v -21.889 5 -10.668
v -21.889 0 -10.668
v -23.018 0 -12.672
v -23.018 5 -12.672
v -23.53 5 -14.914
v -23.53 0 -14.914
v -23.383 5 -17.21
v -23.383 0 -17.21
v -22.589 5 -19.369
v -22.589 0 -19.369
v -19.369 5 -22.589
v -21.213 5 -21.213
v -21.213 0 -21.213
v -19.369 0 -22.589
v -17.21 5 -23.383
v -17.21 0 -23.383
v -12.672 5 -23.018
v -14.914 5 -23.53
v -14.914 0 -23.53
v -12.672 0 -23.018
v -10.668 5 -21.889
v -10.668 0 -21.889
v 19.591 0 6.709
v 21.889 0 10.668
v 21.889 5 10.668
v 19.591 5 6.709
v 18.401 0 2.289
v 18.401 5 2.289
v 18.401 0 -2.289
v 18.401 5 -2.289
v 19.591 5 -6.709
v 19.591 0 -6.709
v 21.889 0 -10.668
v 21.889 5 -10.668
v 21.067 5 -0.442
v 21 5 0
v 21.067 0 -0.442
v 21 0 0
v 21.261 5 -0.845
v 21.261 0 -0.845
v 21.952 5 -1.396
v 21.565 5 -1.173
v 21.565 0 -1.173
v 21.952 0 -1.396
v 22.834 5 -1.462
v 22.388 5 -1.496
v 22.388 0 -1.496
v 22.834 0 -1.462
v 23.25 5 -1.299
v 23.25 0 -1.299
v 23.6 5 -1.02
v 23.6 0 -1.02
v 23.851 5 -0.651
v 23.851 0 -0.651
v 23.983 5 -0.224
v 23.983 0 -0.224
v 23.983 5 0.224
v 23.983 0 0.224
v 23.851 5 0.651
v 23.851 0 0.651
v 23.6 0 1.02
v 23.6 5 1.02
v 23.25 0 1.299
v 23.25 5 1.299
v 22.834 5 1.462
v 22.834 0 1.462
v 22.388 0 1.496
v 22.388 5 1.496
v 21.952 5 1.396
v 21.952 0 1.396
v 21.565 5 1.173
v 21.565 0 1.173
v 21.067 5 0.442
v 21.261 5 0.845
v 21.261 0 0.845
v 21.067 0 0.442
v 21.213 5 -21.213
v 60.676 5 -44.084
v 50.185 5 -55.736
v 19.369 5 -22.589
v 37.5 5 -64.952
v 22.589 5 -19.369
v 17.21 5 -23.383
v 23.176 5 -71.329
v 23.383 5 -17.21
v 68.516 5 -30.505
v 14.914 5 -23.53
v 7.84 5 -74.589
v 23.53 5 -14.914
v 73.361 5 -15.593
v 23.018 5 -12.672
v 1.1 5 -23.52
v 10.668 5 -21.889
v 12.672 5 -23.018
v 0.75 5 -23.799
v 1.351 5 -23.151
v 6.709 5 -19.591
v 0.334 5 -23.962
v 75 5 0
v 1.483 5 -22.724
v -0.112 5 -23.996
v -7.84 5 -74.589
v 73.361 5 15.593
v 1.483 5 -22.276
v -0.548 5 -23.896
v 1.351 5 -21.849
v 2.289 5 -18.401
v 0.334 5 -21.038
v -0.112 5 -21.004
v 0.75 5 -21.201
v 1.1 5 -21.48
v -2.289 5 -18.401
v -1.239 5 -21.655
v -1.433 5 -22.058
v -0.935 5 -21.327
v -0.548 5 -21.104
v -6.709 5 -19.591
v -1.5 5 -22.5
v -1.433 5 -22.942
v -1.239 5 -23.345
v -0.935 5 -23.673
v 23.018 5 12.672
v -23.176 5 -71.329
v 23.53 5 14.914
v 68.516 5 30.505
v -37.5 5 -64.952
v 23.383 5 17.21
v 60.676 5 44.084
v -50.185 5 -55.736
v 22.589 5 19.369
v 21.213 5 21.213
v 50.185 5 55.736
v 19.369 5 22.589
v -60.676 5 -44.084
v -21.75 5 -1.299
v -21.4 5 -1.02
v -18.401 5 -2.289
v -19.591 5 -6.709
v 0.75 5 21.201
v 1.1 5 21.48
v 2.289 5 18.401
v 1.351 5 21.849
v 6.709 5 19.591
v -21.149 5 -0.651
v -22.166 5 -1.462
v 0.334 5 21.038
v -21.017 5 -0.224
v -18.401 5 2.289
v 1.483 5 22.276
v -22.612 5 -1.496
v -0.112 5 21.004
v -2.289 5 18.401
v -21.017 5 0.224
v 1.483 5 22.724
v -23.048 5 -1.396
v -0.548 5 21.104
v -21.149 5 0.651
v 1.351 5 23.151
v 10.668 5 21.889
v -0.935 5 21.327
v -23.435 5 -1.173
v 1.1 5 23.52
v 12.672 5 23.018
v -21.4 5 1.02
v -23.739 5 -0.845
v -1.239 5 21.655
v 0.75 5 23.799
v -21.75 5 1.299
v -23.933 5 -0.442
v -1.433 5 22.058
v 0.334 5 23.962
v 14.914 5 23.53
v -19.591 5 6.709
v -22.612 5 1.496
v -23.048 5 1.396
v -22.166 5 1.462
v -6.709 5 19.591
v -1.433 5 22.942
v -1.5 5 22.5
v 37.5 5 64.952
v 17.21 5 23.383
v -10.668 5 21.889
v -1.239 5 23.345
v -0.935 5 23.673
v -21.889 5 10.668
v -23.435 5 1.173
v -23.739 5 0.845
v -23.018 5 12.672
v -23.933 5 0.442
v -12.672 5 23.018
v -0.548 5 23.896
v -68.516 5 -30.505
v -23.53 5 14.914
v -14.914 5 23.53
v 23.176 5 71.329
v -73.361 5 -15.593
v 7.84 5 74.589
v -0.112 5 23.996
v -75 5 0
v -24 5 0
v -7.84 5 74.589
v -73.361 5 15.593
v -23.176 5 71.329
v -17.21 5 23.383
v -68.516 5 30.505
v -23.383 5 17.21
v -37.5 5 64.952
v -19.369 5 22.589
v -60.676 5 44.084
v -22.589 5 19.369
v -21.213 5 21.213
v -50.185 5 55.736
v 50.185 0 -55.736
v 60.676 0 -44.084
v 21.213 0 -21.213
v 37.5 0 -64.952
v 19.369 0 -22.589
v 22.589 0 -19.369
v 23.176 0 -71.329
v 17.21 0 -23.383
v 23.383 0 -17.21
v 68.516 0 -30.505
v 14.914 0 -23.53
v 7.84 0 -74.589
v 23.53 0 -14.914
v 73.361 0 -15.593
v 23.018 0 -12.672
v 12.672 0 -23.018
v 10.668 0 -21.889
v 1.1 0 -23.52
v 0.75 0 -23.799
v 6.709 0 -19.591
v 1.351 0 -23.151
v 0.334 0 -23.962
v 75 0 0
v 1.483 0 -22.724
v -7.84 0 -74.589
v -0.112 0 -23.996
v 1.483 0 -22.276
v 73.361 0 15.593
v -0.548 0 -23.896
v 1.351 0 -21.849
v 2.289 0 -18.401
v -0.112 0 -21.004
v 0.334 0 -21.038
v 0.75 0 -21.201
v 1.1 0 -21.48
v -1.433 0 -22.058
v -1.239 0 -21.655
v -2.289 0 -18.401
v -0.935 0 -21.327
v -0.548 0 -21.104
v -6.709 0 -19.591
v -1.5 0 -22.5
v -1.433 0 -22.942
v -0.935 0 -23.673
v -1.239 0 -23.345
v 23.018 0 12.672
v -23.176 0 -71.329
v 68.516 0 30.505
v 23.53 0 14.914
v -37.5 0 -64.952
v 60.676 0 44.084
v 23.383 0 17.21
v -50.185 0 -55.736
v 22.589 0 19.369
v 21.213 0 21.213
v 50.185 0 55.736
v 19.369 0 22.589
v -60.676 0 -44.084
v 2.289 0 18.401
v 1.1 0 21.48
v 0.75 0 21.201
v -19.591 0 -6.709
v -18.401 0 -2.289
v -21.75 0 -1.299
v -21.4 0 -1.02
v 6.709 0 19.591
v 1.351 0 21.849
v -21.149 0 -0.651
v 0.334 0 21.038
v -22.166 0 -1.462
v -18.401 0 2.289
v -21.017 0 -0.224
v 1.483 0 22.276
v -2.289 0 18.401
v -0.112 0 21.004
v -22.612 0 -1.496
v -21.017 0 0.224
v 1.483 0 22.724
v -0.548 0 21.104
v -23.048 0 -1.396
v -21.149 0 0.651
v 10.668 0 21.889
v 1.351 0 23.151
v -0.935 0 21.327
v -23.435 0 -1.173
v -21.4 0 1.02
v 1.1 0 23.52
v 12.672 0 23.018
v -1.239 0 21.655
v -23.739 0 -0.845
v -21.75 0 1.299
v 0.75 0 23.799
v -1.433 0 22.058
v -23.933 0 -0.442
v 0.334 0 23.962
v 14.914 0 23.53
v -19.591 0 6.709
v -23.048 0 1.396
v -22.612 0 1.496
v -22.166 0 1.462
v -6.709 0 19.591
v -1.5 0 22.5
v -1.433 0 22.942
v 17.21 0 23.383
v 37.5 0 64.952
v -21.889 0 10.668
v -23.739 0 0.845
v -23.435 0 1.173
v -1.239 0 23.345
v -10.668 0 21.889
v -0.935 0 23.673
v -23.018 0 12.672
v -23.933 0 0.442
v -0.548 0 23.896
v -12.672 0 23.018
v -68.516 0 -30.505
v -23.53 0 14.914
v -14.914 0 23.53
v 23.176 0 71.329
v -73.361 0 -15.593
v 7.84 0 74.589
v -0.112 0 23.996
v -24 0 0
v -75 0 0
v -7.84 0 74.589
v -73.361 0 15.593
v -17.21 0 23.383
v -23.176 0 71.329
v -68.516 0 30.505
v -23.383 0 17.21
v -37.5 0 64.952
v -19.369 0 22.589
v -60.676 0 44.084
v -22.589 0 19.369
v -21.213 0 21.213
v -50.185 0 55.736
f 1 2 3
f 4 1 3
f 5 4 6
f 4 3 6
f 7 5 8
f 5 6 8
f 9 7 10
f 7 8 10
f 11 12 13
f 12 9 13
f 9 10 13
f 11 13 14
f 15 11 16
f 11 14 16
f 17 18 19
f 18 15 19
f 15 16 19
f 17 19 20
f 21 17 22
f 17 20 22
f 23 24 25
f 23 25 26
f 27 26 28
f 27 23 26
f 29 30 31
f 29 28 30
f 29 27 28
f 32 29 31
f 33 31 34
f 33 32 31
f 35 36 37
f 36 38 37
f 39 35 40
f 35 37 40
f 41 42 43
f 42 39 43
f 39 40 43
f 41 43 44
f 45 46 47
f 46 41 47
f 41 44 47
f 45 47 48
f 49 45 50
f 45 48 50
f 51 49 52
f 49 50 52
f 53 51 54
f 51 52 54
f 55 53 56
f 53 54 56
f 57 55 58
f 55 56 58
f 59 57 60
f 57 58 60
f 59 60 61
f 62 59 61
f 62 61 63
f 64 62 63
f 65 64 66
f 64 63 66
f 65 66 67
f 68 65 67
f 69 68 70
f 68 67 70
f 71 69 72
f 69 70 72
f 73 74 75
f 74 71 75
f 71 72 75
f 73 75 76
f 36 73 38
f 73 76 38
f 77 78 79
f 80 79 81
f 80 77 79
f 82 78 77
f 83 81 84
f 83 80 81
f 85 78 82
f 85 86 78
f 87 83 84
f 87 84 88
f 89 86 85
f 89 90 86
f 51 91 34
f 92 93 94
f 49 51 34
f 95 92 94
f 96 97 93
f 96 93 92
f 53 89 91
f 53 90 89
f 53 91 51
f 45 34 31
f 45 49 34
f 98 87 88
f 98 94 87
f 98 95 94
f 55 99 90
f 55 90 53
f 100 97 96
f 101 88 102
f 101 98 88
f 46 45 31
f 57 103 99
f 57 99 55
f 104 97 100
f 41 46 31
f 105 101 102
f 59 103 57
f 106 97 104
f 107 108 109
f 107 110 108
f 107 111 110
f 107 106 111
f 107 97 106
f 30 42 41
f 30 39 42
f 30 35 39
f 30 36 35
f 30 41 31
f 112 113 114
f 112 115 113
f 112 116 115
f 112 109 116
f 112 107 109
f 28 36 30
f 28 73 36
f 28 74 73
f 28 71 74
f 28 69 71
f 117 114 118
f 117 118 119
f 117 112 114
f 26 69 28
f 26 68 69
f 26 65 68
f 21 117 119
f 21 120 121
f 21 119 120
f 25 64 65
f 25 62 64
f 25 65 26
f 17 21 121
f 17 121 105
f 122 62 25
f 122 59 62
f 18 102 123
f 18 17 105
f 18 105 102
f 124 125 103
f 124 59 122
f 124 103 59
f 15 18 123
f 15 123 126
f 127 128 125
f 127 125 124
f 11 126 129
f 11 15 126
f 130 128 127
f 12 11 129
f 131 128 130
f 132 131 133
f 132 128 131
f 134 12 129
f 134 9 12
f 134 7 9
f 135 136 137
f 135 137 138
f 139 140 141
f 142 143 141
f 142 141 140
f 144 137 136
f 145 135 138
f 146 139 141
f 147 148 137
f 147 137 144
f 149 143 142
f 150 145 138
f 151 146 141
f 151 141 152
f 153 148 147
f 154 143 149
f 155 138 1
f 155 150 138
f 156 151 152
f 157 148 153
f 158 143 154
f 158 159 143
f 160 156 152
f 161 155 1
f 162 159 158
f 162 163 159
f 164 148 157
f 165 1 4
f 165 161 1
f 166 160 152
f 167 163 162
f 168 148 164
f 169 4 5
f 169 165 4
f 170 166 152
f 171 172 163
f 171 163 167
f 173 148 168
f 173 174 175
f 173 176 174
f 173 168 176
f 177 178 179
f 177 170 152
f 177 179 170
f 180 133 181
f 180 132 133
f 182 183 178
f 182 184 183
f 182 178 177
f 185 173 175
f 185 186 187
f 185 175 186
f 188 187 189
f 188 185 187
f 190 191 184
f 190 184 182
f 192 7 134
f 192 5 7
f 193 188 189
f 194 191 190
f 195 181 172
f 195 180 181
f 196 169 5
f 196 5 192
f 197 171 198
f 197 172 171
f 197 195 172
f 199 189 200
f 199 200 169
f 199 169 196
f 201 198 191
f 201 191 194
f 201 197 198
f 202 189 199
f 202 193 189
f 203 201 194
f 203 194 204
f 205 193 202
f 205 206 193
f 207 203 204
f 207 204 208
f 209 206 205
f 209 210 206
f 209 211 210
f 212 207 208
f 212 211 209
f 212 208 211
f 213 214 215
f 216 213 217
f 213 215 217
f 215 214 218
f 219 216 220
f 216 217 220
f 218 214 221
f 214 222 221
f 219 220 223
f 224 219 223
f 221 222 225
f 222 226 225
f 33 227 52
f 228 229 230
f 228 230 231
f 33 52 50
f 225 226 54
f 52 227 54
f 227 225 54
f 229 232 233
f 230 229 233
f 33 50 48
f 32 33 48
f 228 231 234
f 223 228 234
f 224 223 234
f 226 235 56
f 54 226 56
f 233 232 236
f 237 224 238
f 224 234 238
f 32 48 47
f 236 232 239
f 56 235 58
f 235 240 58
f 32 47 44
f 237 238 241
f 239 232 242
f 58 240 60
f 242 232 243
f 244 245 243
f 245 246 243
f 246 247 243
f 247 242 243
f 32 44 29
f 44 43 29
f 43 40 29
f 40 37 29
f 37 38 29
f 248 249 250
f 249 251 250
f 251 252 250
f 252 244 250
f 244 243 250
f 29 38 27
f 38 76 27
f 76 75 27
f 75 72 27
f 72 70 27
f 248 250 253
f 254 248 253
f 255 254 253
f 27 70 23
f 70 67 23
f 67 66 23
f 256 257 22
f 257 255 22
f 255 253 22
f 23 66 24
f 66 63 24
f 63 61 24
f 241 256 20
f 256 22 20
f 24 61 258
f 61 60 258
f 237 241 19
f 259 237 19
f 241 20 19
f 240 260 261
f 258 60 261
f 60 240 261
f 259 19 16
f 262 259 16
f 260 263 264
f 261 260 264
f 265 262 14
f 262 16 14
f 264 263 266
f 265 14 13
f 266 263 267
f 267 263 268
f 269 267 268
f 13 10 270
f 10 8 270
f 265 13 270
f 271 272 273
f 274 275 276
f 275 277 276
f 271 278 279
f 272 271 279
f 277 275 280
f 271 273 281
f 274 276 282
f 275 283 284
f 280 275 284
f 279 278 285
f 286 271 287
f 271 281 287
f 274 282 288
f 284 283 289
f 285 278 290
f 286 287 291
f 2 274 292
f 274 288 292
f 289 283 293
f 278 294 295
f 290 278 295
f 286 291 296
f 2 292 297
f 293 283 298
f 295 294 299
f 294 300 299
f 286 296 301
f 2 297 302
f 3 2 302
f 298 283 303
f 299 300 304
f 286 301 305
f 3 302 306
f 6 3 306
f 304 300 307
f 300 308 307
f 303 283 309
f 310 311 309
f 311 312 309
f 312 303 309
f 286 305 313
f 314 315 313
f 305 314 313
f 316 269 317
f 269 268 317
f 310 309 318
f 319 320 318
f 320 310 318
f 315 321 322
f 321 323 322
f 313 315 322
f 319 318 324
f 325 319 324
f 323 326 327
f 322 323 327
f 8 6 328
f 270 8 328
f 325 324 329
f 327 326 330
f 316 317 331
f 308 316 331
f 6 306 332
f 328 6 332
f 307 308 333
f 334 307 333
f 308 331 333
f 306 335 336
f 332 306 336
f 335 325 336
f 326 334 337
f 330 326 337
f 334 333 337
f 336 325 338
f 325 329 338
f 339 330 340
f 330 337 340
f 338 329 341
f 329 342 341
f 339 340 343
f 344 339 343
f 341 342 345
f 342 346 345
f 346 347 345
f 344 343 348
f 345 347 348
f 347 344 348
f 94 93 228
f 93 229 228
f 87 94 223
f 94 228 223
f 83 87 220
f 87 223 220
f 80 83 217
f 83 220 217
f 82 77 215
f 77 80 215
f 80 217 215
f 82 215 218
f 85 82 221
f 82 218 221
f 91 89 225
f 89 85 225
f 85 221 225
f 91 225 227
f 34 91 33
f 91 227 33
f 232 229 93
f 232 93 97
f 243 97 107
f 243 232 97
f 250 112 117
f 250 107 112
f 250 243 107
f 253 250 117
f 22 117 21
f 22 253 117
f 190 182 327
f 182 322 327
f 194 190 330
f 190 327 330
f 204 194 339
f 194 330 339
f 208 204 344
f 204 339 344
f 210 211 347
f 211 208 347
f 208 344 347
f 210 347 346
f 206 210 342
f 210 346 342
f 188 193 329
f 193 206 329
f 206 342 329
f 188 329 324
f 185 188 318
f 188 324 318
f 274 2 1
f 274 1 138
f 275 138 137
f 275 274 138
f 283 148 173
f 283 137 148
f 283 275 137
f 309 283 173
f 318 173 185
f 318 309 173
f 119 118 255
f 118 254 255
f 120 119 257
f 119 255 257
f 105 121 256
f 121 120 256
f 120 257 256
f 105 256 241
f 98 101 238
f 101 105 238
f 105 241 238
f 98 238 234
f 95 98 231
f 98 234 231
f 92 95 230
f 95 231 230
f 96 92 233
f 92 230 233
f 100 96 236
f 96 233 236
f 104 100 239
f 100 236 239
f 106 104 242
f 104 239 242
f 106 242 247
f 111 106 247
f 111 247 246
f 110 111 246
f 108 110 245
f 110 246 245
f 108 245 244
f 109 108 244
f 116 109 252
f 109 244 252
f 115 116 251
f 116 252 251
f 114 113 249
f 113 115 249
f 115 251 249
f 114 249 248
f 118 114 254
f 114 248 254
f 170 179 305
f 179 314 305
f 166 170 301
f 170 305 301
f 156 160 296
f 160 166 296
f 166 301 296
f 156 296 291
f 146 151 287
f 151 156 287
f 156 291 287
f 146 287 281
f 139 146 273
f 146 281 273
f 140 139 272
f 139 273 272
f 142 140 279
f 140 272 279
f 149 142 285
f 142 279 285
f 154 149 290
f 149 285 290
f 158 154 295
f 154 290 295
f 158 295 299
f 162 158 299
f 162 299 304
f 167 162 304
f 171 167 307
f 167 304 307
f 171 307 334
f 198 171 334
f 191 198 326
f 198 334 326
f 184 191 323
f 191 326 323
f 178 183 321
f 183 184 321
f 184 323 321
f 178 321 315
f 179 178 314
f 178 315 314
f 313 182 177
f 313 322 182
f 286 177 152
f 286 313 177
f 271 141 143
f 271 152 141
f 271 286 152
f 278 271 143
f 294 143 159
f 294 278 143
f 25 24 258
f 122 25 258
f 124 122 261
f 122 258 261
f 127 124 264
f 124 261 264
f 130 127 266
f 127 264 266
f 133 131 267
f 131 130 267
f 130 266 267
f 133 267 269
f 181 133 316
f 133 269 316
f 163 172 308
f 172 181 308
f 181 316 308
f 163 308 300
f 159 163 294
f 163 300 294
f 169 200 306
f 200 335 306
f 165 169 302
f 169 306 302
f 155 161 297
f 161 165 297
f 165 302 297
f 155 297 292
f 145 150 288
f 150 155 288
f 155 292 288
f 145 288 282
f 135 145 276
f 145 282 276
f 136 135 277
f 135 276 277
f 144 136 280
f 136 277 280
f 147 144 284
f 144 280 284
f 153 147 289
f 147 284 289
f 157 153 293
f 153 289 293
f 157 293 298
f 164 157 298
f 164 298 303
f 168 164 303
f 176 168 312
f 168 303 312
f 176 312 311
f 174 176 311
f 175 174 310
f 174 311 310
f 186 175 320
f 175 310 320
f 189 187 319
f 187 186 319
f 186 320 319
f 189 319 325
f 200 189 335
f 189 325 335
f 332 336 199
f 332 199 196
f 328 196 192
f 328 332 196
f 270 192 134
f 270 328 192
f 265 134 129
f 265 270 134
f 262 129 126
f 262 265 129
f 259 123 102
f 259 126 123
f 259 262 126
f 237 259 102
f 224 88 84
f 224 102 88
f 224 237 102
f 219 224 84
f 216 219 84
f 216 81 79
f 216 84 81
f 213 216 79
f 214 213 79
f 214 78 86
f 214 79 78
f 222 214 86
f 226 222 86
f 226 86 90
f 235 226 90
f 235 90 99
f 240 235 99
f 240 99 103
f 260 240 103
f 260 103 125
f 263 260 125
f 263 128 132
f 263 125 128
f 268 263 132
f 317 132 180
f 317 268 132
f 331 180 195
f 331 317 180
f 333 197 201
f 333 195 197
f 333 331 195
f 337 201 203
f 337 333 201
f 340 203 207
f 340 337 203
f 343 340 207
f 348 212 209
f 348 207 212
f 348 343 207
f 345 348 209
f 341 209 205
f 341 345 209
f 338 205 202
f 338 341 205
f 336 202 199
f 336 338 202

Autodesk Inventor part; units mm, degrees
ref_plane "YZ Plane" through (0, 0, 0) normal (1, 0, 0) x (0, 1, 0)
ref_plane "XZ Plane" through (0, 0, 0) normal (0, 1, 0) x (-1, 0, 0)
ref_plane "XY Plane" through (0, 0, 0) normal (0, 0, 1) x (1, 0, 0)
sketch "Boceto1" plane through (0, 0, 0) normal (0, 1, 0) x (-1, 0, 0)
  circle A0 centre (0, 0) radius 15
  circle A1 centre (0, 0) radius 75
  arc A2 (-10.6675, 21.8887) -> (10.6675, 21.8887) centre (0, 35.706) ccw projected
  arc A3 (21.8887, 10.6675) -> (10.6675, 21.8887) centre (15.5563, 15.5563) ccw projected
  arc A4 (21.8887, 10.6675) -> (21.8887, -10.6675) centre (35.706, 0) ccw projected
  arc A5 (10.6675, -21.8887) -> (21.8887, -10.6675) centre (15.5563, -15.5563) ccw projected
  arc A6 (10.6675, -21.8887) -> (-10.6675, -21.8887) centre (0, -35.706) ccw projected
  arc A7 (-21.8887, -10.6675) -> (-10.6675, -21.8887) centre (-15.5563, -15.5563) ccw projected
  arc A8 (-21.8887, -10.6675) -> (-21.8887, 10.6675) centre (-35.706, 0) ccw projected
  arc A9 (-10.6675, 21.8887) -> (-21.8887, 10.6675) centre (-15.5563, 15.5563) ccw projected
  circle A10 centre (0, -22.5) radius 1.5 projected
  circle A11 centre (22.5, 0) radius 1.5 projected
  circle A12 centre (0, 22.5) radius 1.5 projected
  circle A13 centre (-22.5, 0) radius 1.5 projected
  circle A14 centre (0, 0) radius 15.25 projected
  dimension "d0" = 30
  dimension "d1" = 150
extrude "Extrusión1" add sketch "Boceto1" along normal blind 5 contours A1
properties part number "Plato T5"
